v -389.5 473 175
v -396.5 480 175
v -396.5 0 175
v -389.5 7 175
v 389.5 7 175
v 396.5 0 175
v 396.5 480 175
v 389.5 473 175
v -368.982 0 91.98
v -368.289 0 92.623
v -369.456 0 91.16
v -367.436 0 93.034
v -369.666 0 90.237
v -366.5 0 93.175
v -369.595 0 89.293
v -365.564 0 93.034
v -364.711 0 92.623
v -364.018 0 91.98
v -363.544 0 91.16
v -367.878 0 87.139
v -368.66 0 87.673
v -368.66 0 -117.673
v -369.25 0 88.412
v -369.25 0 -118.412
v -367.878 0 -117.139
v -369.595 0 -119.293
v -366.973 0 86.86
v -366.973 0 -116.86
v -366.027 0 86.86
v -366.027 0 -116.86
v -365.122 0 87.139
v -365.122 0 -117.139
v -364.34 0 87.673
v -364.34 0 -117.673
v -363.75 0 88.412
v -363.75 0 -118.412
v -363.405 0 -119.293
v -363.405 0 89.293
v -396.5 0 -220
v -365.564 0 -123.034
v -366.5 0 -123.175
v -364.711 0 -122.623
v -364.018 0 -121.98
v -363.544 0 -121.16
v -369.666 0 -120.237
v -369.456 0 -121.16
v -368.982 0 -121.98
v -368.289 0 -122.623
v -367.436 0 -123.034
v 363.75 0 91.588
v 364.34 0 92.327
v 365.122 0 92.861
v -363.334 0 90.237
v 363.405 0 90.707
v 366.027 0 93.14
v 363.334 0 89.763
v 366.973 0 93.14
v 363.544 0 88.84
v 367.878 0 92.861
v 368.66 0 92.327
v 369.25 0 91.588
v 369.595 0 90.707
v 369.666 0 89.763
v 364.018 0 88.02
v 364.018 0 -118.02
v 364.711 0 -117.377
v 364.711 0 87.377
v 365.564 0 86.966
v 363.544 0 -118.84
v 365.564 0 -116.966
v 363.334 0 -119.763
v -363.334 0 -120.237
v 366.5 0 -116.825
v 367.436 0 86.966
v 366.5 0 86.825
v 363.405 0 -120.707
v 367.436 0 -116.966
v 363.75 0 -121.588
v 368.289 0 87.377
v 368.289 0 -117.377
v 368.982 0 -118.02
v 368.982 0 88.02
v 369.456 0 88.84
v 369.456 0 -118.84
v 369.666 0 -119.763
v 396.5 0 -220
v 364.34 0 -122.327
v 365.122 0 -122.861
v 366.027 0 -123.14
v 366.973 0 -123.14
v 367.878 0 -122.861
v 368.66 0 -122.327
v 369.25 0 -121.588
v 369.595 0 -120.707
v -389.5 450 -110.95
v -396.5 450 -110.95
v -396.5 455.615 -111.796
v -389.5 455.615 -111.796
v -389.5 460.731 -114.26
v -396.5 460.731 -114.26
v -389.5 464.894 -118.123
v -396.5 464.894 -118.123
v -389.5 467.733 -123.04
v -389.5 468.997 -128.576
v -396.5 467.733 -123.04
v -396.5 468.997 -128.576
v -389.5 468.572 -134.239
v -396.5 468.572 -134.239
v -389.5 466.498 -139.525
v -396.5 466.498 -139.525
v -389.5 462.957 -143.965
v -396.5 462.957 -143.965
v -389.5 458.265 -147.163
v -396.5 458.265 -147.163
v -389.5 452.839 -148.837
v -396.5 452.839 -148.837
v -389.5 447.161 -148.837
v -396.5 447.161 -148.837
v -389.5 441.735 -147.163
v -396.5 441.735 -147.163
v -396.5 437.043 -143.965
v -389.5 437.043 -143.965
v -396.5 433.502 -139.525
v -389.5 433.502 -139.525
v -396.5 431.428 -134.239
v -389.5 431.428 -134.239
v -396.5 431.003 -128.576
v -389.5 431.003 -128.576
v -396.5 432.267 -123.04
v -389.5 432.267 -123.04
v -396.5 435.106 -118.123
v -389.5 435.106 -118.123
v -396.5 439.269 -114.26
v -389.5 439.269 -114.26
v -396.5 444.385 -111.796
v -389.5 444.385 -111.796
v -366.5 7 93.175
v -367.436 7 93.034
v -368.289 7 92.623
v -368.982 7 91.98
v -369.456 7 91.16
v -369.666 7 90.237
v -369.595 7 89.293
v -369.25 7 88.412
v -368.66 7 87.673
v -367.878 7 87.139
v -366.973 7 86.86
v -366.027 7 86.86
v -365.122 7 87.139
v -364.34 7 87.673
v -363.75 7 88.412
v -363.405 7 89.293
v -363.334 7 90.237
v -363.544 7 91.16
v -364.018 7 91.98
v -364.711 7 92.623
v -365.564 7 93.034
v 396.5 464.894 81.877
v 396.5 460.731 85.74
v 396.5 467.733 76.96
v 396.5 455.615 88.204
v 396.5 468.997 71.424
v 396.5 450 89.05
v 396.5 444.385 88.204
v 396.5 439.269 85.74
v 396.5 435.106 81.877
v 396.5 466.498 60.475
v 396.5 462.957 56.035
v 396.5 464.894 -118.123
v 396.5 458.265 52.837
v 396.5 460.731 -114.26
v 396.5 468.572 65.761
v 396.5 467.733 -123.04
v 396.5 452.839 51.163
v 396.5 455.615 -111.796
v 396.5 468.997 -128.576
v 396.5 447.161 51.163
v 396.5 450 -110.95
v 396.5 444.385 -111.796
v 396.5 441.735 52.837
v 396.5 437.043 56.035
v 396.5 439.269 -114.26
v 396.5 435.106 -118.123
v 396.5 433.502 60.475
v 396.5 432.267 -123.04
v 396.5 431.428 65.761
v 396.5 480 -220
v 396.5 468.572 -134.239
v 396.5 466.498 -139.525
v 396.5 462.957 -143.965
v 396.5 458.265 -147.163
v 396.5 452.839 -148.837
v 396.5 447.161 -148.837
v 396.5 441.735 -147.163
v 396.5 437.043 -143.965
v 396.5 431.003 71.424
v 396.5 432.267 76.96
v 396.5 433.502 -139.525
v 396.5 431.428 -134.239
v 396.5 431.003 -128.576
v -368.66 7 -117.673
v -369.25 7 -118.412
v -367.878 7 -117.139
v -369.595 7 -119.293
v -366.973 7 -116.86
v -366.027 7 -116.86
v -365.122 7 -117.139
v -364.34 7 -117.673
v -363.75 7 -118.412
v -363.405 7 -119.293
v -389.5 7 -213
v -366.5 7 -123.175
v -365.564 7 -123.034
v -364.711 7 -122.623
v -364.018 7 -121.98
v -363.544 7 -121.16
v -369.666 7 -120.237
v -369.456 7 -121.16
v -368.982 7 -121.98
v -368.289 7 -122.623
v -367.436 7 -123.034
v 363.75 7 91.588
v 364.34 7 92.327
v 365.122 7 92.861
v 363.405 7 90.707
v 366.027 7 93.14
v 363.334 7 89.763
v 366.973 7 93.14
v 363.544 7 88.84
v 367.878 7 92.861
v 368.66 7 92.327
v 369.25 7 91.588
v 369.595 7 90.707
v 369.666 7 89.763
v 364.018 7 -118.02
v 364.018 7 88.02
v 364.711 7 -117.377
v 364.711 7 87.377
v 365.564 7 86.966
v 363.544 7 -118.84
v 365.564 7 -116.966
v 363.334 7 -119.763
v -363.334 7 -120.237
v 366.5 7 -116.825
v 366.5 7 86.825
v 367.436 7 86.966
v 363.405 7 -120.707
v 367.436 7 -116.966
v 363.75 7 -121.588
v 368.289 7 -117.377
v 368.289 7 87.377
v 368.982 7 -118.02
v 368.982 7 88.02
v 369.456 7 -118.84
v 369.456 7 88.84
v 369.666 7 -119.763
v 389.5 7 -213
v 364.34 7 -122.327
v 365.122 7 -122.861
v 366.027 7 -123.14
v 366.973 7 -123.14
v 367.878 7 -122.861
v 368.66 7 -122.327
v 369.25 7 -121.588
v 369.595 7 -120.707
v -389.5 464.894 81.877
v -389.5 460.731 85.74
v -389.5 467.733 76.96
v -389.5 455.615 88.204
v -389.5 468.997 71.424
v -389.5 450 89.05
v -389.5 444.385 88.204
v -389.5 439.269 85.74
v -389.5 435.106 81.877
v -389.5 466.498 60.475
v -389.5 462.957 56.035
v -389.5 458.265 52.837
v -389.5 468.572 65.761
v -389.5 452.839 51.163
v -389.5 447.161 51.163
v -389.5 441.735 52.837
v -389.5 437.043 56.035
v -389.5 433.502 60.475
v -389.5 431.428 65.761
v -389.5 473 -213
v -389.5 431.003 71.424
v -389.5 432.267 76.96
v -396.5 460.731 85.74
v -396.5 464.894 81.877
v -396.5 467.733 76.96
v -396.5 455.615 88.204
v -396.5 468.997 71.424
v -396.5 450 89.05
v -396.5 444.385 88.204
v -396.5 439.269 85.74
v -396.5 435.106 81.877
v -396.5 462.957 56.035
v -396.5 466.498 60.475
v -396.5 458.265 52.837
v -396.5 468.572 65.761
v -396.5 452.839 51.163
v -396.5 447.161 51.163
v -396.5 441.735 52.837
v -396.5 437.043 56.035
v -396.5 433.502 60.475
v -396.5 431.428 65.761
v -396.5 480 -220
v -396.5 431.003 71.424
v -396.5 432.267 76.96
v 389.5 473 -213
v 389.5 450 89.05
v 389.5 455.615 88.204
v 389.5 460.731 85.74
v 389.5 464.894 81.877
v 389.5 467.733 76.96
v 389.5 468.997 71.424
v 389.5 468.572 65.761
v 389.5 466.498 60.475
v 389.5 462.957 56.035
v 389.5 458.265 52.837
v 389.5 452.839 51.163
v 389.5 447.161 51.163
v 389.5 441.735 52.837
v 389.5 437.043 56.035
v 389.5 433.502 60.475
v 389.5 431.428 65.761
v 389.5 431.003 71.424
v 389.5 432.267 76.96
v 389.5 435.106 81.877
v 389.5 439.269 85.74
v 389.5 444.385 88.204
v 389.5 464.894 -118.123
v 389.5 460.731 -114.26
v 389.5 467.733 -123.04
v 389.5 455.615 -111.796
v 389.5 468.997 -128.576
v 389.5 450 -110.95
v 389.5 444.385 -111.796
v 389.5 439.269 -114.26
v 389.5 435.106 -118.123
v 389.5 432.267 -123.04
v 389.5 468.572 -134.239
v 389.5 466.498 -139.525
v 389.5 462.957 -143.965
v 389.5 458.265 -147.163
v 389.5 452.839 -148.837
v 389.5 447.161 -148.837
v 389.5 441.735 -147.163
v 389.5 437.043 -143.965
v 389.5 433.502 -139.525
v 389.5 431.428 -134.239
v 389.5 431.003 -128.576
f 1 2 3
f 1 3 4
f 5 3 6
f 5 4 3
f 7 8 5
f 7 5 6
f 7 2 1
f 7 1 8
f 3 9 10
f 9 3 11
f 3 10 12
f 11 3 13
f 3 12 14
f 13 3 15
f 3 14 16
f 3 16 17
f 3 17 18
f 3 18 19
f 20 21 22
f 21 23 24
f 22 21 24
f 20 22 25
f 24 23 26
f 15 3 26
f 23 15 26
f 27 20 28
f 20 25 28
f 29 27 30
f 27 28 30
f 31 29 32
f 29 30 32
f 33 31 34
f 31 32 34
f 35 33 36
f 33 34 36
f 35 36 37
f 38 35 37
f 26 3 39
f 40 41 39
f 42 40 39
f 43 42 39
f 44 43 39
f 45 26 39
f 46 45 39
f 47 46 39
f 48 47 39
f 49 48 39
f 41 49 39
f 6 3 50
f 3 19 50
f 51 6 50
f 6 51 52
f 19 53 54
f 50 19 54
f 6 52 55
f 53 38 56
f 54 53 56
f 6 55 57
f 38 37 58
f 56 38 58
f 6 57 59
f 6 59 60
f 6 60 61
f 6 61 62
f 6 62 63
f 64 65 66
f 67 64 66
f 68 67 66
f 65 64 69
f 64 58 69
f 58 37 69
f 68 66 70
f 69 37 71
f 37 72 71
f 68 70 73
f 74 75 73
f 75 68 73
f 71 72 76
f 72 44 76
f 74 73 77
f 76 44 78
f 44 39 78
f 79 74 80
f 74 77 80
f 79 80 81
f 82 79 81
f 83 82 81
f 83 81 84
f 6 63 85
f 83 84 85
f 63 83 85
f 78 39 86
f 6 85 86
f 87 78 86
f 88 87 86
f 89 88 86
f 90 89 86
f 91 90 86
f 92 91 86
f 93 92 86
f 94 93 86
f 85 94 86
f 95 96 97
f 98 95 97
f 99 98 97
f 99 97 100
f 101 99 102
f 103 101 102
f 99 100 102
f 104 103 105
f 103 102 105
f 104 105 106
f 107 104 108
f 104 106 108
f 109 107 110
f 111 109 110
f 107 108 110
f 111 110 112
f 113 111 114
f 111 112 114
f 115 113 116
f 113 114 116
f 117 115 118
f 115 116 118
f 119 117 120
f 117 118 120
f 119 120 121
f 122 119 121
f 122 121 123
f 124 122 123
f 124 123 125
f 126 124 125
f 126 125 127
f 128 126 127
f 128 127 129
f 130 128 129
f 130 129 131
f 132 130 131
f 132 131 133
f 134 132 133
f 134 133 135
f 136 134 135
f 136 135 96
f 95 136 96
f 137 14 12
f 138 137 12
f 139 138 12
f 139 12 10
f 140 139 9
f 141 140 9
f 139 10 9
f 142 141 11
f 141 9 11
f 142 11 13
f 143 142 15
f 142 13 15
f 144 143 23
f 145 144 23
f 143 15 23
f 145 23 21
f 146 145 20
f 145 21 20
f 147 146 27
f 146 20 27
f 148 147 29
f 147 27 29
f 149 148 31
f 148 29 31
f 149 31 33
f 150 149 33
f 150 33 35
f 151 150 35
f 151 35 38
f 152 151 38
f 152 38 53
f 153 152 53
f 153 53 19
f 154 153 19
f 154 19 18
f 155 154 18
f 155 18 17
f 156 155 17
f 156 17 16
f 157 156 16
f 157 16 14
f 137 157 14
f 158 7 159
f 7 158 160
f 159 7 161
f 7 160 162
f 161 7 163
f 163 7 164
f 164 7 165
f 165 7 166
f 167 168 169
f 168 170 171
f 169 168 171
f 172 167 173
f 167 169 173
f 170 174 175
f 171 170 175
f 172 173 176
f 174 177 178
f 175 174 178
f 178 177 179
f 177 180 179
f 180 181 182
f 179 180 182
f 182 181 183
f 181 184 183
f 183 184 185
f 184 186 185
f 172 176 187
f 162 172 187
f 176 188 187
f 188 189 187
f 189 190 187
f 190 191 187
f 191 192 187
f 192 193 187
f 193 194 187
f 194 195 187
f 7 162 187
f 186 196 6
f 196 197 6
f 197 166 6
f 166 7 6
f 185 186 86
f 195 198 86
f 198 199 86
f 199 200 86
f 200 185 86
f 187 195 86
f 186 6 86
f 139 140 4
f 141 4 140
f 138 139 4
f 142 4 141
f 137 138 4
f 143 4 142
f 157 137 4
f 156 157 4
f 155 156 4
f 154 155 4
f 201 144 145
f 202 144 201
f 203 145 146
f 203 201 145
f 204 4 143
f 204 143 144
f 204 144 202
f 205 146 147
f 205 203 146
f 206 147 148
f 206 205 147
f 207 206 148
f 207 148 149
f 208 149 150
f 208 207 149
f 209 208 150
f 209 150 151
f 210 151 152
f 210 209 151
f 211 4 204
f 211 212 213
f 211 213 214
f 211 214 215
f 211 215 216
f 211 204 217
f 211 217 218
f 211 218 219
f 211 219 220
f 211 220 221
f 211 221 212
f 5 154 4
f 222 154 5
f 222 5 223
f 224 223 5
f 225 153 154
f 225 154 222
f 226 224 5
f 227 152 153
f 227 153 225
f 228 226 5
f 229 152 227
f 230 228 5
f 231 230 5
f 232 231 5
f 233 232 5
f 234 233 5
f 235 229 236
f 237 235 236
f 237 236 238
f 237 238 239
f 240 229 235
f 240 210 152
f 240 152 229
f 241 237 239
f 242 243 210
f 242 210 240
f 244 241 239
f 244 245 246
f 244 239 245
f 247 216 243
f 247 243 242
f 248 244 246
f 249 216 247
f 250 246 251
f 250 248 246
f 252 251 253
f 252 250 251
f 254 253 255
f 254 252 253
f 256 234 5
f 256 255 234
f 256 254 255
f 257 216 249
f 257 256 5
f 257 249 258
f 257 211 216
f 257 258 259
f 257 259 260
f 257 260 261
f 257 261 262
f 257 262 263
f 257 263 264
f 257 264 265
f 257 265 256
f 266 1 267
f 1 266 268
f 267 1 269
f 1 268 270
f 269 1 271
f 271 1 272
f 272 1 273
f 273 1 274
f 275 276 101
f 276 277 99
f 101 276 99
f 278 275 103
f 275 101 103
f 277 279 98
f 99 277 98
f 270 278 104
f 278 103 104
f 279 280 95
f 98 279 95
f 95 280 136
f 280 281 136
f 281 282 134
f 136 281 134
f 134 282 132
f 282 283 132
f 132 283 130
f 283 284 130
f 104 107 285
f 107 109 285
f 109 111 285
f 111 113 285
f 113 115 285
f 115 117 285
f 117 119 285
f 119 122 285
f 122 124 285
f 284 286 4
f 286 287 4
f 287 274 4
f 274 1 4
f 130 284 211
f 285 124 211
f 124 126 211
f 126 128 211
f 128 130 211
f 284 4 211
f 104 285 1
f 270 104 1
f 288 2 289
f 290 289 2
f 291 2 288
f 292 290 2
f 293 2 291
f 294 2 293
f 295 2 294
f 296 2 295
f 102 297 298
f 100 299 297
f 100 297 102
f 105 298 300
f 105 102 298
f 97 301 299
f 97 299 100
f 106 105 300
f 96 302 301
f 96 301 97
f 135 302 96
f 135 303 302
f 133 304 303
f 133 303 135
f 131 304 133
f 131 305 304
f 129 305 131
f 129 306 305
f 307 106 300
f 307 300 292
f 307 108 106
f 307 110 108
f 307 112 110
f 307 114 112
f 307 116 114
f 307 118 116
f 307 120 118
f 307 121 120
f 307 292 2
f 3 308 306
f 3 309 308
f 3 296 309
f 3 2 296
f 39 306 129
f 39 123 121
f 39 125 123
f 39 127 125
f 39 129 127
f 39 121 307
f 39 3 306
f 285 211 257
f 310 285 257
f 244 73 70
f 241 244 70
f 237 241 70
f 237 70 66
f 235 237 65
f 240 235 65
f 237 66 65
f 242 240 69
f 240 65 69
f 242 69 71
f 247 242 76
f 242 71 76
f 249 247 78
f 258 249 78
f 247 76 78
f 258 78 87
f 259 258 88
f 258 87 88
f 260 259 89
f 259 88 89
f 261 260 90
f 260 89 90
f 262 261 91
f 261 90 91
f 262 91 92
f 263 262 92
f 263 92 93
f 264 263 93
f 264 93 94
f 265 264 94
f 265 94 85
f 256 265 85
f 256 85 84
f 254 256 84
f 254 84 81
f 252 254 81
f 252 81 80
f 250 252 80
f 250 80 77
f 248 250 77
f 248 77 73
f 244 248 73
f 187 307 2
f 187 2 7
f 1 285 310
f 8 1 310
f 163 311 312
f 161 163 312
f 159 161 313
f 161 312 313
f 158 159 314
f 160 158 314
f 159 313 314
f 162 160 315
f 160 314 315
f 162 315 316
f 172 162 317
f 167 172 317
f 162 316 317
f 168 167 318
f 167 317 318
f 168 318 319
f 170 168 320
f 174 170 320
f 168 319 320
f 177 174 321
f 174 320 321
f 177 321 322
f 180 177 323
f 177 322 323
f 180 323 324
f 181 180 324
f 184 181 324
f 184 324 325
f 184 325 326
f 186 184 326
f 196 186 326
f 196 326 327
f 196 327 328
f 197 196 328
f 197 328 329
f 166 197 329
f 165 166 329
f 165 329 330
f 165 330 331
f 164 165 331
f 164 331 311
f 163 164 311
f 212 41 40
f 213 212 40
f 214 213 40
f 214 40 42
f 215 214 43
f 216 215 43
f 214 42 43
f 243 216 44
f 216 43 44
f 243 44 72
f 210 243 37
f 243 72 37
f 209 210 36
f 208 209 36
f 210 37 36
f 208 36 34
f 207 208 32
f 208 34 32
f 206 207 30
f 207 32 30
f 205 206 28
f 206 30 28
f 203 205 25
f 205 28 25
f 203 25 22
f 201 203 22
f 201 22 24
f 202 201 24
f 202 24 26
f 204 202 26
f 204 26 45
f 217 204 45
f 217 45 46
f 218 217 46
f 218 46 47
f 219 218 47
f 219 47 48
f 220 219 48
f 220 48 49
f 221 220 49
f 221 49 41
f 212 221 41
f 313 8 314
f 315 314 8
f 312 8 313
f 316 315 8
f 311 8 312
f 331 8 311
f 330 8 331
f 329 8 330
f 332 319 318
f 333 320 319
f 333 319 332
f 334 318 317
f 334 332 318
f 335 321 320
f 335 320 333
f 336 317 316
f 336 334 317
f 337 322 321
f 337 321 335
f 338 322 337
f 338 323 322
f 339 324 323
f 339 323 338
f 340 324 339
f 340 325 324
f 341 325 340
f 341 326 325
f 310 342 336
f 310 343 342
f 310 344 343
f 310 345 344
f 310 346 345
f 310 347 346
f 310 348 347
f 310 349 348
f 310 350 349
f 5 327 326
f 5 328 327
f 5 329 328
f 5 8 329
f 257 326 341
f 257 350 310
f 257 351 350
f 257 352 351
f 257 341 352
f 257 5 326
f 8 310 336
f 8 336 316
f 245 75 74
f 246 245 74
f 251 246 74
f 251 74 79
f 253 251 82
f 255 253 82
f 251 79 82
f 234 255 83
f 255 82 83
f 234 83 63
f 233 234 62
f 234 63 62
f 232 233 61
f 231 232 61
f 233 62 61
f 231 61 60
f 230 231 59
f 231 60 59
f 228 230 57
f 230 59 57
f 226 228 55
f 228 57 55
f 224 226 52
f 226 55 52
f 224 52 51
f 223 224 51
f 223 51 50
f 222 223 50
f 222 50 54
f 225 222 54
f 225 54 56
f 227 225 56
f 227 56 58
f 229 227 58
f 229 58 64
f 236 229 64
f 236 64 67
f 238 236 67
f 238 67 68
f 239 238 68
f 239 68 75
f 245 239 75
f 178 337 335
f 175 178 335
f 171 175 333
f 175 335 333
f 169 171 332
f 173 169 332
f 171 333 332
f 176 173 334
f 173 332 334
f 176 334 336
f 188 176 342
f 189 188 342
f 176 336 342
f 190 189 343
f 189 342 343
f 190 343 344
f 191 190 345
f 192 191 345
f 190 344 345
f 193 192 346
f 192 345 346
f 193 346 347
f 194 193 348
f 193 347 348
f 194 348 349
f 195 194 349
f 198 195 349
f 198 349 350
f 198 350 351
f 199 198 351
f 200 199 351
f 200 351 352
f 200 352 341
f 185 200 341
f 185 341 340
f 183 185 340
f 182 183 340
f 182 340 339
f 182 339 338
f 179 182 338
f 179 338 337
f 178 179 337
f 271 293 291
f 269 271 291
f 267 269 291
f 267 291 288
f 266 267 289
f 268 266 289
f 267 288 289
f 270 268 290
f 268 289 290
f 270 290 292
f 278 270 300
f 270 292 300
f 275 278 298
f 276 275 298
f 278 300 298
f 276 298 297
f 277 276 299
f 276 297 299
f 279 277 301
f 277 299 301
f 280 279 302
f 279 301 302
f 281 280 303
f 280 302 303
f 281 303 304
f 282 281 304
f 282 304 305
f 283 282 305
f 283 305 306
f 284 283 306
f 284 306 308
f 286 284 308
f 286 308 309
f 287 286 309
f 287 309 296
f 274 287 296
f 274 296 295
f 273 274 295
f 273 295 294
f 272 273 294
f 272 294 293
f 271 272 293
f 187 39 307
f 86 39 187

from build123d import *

# Parameters (mm, degrees)
CROQUIS1_W              = 793
CROQUIS1_H              = 440
SALIENTE_EXTRUIR1_DEPTH = 480
VACIADO1_T              = -7
CROQUIS2_R              = 12.7
CORTAR_EXTRUIR1_DEPTH   = 80
CROQUIS3_R              = 6.35
CORTAR_EXTRUIR2_DEPTH   = 10
CROQUIS5_R              = 6.35
CORTAR_EXTRUIR4_DEPTH   = 10
CROQUIS6_R              = 19.05
CORTAR_EXTRUIR5_DEPTH   = 848
CROQUIS8_R              = 12.7
CORTAR_EXTRUIR6_DEPTH   = 10
CROQUIS9_W              = 35.052267511
CROQUIS9_H              = 245.374735938
SALIENTE_EXTRUIR2_DEPTH = 7
CROQUIS15_R             = 3.175
CORTAR_EXTRUIR10_DEPTH  = 10
CROQUIS18_R             = 3.175
CROQUIS18_R_2           = 5.554937391
CORTAR_EXTRUIR12_DEPTH  = 10
CROQUIS19_W             = 793
CROQUIS19_H             = 480
CORTAR_EXTRUIR13_DEPTH  = 45
CROQUIS20_W             = 40.222844752
CROQUIS20_H             = 335.190372933
SALIENTE_EXTRUIR3_DEPTH = 7
CROQUIS22_W             = 754.715939893
CROQUIS22_H             = 447.32434432
SALIENTE_EXTRUIR4_DEPTH = 7


with BuildPart() as part:
    # Croquis1 → Saliente-Extruir1 (new body)
    with BuildSketch(Plane(origin=(0, 0, 0), x_dir=(1, 0, 0), z_dir=(0, 1, 0))):
        Rectangle(CROQUIS1_W, CROQUIS1_H)
    extrude(amount=SALIENTE_EXTRUIR1_DEPTH)

    # Vaciado1
    vaciado1_openings = [part.faces().sort_by_distance(p)[0] for p in [
        (0, 240, 220),
    ]]
    offset(amount=VACIADO1_T, openings=vaciado1_openings, kind=Kind.INTERSECTION)

    # Croquis2 → Cortar-Extruir1 (cut)
    with BuildSketch(Plane.XZ):
        with Locations(Location((-340.681431581, 41.288678468, 0), (0, 0, 270))):
            Circle(CROQUIS2_R)
    cortar_extruir1 = extrude(amount=-CORTAR_EXTRUIR1_DEPTH, mode=Mode.SUBTRACT)

    # Croquis3 → Cortar-Extruir2 (cut)
    with BuildSketch(Plane.XZ):
        with Locations(Location((-340.681431581, 81.288678468, 0), (0, 0, 270))):
            Circle(CROQUIS3_R)
    cortar_extruir2 = extrude(amount=-CORTAR_EXTRUIR2_DEPTH, mode=Mode.SUBTRACT)

    # Croquis5 → Cortar-Extruir4 (cut)
    with BuildSketch(Plane.XZ):
        with Locations(Location((-340.681431581, 121.288678468, 0), (0, 0, 270))):
            Circle(CROQUIS5_R)
    cortar_extruir4 = extrude(amount=-CORTAR_EXTRUIR4_DEPTH, mode=Mode.SUBTRACT)

    # Croquis6 → Cortar-Extruir5 (cut)
    with BuildSketch(Plane.ZY.offset(396.5)):
        with Locations((-130, 450)):
            Circle(CROQUIS6_R)
        with Locations((70, 450)):
            Circle(CROQUIS6_R)
    extrude(amount=-CORTAR_EXTRUIR5_DEPTH, mode=Mode.SUBTRACT)

    # Simetría1: Cortar-Extruir1, Cortar-Extruir2, Cortar-Extruir4 across plane
    add(cortar_extruir1.mirror(Plane(origin=(0, 0, 0), x_dir=(0, 0, 1), z_dir=(1, 0, 0))), mode=Mode.SUBTRACT)
    add(cortar_extruir2.mirror(Plane(origin=(0, 0, 0), x_dir=(0, 0, 1), z_dir=(1, 0, 0))), mode=Mode.SUBTRACT)
    add(cortar_extruir4.mirror(Plane(origin=(0, 0, 0), x_dir=(0, 0, 1), z_dir=(1, 0, 0))), mode=Mode.SUBTRACT)

    # Croquis8 → Cortar-Extruir6 (cut)
    with BuildSketch(Plane.XZ):
        with Locations(Location((340.681431581, -121.411321532, 0), (0, 0, 270))):
            Circle(CROQUIS8_R)
    extrude(amount=-CORTAR_EXTRUIR6_DEPTH, mode=Mode.SUBTRACT)

    # Croquis9 → Saliente-Extruir2 (add)
    with BuildSketch(Plane(origin=(0, 7, 0), x_dir=(1, 0, 0), z_dir=(0, 1, 0))):
        with Locations((-340.681431581, -81.288678468)):
            Rectangle(CROQUIS9_W, CROQUIS9_H)
    extrude(amount=-SALIENTE_EXTRUIR2_DEPTH)

    # Croquis15 → Cortar-Extruir10 (cut)
    with BuildSketch(Plane.XZ):
        with Locations(Location((-366.5, -120, 0), (0, 0, 270))):
            Circle(CROQUIS15_R)
        with Locations(Location((-366.5, 90, 0), (0, 0, 90))):
            Circle(CROQUIS15_R)
        with Locations(Location((366.5, -120, 0), (0, 0, 90))):
            Circle(CROQUIS15_R)
        with Locations(Location((366.5, 90, 0), (0, 0, 270))):
            Circle(CROQUIS15_R)
    extrude(amount=-CORTAR_EXTRUIR10_DEPTH, mode=Mode.SUBTRACT)

    # Croquis18 → Cortar-Extruir12 (cut)
    with BuildSketch(Plane.XY.offset(-213)):
        with Locations((-348, 438)):
            Circle(CROQUIS18_R)
        with Locations((0, 438)):
            Circle(CROQUIS18_R)
        with Locations((348, 438)):
            Circle(CROQUIS18_R)
        with Locations((348, 240)):
            Circle(CROQUIS18_R)
        with Locations((348, 42)):
            Circle(CROQUIS18_R)
        with Locations((0, 42)):
            Circle(CROQUIS18_R)
        with Locations((-348, 42)):
            Circle(CROQUIS18_R)
        with Locations((-348, 240)):
            Circle(CROQUIS18_R_2)
    extrude(amount=-CORTAR_EXTRUIR12_DEPTH, mode=Mode.SUBTRACT)

    # Croquis19 → Cortar-Extruir13 (cut)
    with BuildSketch(Plane.XY.offset(220)):
        with Locations((0, 240)):
            Rectangle(CROQUIS19_W, CROQUIS19_H)
    extrude(amount=-CORTAR_EXTRUIR13_DEPTH, mode=Mode.SUBTRACT)

    # Croquis20 → Saliente-Extruir3 (add)
    with BuildSketch(Plane.XZ):
        with Locations((336.531134424, -29.98561058)):
            Rectangle(CROQUIS20_W, CROQUIS20_H)
    extrude(amount=-SALIENTE_EXTRUIR3_DEPTH)

    # Croquis22 → Saliente-Extruir4 (add)
    with BuildSketch(Plane(origin=(0, 0, -220), x_dir=(-1, 0, 0), z_dir=(0, 0, -1))):
        with Locations((2.077532213, 243.10690677)):
            Rectangle(CROQUIS22_W, CROQUIS22_H)
    extrude(amount=-SALIENTE_EXTRUIR4_DEPTH)


solid = part.part
